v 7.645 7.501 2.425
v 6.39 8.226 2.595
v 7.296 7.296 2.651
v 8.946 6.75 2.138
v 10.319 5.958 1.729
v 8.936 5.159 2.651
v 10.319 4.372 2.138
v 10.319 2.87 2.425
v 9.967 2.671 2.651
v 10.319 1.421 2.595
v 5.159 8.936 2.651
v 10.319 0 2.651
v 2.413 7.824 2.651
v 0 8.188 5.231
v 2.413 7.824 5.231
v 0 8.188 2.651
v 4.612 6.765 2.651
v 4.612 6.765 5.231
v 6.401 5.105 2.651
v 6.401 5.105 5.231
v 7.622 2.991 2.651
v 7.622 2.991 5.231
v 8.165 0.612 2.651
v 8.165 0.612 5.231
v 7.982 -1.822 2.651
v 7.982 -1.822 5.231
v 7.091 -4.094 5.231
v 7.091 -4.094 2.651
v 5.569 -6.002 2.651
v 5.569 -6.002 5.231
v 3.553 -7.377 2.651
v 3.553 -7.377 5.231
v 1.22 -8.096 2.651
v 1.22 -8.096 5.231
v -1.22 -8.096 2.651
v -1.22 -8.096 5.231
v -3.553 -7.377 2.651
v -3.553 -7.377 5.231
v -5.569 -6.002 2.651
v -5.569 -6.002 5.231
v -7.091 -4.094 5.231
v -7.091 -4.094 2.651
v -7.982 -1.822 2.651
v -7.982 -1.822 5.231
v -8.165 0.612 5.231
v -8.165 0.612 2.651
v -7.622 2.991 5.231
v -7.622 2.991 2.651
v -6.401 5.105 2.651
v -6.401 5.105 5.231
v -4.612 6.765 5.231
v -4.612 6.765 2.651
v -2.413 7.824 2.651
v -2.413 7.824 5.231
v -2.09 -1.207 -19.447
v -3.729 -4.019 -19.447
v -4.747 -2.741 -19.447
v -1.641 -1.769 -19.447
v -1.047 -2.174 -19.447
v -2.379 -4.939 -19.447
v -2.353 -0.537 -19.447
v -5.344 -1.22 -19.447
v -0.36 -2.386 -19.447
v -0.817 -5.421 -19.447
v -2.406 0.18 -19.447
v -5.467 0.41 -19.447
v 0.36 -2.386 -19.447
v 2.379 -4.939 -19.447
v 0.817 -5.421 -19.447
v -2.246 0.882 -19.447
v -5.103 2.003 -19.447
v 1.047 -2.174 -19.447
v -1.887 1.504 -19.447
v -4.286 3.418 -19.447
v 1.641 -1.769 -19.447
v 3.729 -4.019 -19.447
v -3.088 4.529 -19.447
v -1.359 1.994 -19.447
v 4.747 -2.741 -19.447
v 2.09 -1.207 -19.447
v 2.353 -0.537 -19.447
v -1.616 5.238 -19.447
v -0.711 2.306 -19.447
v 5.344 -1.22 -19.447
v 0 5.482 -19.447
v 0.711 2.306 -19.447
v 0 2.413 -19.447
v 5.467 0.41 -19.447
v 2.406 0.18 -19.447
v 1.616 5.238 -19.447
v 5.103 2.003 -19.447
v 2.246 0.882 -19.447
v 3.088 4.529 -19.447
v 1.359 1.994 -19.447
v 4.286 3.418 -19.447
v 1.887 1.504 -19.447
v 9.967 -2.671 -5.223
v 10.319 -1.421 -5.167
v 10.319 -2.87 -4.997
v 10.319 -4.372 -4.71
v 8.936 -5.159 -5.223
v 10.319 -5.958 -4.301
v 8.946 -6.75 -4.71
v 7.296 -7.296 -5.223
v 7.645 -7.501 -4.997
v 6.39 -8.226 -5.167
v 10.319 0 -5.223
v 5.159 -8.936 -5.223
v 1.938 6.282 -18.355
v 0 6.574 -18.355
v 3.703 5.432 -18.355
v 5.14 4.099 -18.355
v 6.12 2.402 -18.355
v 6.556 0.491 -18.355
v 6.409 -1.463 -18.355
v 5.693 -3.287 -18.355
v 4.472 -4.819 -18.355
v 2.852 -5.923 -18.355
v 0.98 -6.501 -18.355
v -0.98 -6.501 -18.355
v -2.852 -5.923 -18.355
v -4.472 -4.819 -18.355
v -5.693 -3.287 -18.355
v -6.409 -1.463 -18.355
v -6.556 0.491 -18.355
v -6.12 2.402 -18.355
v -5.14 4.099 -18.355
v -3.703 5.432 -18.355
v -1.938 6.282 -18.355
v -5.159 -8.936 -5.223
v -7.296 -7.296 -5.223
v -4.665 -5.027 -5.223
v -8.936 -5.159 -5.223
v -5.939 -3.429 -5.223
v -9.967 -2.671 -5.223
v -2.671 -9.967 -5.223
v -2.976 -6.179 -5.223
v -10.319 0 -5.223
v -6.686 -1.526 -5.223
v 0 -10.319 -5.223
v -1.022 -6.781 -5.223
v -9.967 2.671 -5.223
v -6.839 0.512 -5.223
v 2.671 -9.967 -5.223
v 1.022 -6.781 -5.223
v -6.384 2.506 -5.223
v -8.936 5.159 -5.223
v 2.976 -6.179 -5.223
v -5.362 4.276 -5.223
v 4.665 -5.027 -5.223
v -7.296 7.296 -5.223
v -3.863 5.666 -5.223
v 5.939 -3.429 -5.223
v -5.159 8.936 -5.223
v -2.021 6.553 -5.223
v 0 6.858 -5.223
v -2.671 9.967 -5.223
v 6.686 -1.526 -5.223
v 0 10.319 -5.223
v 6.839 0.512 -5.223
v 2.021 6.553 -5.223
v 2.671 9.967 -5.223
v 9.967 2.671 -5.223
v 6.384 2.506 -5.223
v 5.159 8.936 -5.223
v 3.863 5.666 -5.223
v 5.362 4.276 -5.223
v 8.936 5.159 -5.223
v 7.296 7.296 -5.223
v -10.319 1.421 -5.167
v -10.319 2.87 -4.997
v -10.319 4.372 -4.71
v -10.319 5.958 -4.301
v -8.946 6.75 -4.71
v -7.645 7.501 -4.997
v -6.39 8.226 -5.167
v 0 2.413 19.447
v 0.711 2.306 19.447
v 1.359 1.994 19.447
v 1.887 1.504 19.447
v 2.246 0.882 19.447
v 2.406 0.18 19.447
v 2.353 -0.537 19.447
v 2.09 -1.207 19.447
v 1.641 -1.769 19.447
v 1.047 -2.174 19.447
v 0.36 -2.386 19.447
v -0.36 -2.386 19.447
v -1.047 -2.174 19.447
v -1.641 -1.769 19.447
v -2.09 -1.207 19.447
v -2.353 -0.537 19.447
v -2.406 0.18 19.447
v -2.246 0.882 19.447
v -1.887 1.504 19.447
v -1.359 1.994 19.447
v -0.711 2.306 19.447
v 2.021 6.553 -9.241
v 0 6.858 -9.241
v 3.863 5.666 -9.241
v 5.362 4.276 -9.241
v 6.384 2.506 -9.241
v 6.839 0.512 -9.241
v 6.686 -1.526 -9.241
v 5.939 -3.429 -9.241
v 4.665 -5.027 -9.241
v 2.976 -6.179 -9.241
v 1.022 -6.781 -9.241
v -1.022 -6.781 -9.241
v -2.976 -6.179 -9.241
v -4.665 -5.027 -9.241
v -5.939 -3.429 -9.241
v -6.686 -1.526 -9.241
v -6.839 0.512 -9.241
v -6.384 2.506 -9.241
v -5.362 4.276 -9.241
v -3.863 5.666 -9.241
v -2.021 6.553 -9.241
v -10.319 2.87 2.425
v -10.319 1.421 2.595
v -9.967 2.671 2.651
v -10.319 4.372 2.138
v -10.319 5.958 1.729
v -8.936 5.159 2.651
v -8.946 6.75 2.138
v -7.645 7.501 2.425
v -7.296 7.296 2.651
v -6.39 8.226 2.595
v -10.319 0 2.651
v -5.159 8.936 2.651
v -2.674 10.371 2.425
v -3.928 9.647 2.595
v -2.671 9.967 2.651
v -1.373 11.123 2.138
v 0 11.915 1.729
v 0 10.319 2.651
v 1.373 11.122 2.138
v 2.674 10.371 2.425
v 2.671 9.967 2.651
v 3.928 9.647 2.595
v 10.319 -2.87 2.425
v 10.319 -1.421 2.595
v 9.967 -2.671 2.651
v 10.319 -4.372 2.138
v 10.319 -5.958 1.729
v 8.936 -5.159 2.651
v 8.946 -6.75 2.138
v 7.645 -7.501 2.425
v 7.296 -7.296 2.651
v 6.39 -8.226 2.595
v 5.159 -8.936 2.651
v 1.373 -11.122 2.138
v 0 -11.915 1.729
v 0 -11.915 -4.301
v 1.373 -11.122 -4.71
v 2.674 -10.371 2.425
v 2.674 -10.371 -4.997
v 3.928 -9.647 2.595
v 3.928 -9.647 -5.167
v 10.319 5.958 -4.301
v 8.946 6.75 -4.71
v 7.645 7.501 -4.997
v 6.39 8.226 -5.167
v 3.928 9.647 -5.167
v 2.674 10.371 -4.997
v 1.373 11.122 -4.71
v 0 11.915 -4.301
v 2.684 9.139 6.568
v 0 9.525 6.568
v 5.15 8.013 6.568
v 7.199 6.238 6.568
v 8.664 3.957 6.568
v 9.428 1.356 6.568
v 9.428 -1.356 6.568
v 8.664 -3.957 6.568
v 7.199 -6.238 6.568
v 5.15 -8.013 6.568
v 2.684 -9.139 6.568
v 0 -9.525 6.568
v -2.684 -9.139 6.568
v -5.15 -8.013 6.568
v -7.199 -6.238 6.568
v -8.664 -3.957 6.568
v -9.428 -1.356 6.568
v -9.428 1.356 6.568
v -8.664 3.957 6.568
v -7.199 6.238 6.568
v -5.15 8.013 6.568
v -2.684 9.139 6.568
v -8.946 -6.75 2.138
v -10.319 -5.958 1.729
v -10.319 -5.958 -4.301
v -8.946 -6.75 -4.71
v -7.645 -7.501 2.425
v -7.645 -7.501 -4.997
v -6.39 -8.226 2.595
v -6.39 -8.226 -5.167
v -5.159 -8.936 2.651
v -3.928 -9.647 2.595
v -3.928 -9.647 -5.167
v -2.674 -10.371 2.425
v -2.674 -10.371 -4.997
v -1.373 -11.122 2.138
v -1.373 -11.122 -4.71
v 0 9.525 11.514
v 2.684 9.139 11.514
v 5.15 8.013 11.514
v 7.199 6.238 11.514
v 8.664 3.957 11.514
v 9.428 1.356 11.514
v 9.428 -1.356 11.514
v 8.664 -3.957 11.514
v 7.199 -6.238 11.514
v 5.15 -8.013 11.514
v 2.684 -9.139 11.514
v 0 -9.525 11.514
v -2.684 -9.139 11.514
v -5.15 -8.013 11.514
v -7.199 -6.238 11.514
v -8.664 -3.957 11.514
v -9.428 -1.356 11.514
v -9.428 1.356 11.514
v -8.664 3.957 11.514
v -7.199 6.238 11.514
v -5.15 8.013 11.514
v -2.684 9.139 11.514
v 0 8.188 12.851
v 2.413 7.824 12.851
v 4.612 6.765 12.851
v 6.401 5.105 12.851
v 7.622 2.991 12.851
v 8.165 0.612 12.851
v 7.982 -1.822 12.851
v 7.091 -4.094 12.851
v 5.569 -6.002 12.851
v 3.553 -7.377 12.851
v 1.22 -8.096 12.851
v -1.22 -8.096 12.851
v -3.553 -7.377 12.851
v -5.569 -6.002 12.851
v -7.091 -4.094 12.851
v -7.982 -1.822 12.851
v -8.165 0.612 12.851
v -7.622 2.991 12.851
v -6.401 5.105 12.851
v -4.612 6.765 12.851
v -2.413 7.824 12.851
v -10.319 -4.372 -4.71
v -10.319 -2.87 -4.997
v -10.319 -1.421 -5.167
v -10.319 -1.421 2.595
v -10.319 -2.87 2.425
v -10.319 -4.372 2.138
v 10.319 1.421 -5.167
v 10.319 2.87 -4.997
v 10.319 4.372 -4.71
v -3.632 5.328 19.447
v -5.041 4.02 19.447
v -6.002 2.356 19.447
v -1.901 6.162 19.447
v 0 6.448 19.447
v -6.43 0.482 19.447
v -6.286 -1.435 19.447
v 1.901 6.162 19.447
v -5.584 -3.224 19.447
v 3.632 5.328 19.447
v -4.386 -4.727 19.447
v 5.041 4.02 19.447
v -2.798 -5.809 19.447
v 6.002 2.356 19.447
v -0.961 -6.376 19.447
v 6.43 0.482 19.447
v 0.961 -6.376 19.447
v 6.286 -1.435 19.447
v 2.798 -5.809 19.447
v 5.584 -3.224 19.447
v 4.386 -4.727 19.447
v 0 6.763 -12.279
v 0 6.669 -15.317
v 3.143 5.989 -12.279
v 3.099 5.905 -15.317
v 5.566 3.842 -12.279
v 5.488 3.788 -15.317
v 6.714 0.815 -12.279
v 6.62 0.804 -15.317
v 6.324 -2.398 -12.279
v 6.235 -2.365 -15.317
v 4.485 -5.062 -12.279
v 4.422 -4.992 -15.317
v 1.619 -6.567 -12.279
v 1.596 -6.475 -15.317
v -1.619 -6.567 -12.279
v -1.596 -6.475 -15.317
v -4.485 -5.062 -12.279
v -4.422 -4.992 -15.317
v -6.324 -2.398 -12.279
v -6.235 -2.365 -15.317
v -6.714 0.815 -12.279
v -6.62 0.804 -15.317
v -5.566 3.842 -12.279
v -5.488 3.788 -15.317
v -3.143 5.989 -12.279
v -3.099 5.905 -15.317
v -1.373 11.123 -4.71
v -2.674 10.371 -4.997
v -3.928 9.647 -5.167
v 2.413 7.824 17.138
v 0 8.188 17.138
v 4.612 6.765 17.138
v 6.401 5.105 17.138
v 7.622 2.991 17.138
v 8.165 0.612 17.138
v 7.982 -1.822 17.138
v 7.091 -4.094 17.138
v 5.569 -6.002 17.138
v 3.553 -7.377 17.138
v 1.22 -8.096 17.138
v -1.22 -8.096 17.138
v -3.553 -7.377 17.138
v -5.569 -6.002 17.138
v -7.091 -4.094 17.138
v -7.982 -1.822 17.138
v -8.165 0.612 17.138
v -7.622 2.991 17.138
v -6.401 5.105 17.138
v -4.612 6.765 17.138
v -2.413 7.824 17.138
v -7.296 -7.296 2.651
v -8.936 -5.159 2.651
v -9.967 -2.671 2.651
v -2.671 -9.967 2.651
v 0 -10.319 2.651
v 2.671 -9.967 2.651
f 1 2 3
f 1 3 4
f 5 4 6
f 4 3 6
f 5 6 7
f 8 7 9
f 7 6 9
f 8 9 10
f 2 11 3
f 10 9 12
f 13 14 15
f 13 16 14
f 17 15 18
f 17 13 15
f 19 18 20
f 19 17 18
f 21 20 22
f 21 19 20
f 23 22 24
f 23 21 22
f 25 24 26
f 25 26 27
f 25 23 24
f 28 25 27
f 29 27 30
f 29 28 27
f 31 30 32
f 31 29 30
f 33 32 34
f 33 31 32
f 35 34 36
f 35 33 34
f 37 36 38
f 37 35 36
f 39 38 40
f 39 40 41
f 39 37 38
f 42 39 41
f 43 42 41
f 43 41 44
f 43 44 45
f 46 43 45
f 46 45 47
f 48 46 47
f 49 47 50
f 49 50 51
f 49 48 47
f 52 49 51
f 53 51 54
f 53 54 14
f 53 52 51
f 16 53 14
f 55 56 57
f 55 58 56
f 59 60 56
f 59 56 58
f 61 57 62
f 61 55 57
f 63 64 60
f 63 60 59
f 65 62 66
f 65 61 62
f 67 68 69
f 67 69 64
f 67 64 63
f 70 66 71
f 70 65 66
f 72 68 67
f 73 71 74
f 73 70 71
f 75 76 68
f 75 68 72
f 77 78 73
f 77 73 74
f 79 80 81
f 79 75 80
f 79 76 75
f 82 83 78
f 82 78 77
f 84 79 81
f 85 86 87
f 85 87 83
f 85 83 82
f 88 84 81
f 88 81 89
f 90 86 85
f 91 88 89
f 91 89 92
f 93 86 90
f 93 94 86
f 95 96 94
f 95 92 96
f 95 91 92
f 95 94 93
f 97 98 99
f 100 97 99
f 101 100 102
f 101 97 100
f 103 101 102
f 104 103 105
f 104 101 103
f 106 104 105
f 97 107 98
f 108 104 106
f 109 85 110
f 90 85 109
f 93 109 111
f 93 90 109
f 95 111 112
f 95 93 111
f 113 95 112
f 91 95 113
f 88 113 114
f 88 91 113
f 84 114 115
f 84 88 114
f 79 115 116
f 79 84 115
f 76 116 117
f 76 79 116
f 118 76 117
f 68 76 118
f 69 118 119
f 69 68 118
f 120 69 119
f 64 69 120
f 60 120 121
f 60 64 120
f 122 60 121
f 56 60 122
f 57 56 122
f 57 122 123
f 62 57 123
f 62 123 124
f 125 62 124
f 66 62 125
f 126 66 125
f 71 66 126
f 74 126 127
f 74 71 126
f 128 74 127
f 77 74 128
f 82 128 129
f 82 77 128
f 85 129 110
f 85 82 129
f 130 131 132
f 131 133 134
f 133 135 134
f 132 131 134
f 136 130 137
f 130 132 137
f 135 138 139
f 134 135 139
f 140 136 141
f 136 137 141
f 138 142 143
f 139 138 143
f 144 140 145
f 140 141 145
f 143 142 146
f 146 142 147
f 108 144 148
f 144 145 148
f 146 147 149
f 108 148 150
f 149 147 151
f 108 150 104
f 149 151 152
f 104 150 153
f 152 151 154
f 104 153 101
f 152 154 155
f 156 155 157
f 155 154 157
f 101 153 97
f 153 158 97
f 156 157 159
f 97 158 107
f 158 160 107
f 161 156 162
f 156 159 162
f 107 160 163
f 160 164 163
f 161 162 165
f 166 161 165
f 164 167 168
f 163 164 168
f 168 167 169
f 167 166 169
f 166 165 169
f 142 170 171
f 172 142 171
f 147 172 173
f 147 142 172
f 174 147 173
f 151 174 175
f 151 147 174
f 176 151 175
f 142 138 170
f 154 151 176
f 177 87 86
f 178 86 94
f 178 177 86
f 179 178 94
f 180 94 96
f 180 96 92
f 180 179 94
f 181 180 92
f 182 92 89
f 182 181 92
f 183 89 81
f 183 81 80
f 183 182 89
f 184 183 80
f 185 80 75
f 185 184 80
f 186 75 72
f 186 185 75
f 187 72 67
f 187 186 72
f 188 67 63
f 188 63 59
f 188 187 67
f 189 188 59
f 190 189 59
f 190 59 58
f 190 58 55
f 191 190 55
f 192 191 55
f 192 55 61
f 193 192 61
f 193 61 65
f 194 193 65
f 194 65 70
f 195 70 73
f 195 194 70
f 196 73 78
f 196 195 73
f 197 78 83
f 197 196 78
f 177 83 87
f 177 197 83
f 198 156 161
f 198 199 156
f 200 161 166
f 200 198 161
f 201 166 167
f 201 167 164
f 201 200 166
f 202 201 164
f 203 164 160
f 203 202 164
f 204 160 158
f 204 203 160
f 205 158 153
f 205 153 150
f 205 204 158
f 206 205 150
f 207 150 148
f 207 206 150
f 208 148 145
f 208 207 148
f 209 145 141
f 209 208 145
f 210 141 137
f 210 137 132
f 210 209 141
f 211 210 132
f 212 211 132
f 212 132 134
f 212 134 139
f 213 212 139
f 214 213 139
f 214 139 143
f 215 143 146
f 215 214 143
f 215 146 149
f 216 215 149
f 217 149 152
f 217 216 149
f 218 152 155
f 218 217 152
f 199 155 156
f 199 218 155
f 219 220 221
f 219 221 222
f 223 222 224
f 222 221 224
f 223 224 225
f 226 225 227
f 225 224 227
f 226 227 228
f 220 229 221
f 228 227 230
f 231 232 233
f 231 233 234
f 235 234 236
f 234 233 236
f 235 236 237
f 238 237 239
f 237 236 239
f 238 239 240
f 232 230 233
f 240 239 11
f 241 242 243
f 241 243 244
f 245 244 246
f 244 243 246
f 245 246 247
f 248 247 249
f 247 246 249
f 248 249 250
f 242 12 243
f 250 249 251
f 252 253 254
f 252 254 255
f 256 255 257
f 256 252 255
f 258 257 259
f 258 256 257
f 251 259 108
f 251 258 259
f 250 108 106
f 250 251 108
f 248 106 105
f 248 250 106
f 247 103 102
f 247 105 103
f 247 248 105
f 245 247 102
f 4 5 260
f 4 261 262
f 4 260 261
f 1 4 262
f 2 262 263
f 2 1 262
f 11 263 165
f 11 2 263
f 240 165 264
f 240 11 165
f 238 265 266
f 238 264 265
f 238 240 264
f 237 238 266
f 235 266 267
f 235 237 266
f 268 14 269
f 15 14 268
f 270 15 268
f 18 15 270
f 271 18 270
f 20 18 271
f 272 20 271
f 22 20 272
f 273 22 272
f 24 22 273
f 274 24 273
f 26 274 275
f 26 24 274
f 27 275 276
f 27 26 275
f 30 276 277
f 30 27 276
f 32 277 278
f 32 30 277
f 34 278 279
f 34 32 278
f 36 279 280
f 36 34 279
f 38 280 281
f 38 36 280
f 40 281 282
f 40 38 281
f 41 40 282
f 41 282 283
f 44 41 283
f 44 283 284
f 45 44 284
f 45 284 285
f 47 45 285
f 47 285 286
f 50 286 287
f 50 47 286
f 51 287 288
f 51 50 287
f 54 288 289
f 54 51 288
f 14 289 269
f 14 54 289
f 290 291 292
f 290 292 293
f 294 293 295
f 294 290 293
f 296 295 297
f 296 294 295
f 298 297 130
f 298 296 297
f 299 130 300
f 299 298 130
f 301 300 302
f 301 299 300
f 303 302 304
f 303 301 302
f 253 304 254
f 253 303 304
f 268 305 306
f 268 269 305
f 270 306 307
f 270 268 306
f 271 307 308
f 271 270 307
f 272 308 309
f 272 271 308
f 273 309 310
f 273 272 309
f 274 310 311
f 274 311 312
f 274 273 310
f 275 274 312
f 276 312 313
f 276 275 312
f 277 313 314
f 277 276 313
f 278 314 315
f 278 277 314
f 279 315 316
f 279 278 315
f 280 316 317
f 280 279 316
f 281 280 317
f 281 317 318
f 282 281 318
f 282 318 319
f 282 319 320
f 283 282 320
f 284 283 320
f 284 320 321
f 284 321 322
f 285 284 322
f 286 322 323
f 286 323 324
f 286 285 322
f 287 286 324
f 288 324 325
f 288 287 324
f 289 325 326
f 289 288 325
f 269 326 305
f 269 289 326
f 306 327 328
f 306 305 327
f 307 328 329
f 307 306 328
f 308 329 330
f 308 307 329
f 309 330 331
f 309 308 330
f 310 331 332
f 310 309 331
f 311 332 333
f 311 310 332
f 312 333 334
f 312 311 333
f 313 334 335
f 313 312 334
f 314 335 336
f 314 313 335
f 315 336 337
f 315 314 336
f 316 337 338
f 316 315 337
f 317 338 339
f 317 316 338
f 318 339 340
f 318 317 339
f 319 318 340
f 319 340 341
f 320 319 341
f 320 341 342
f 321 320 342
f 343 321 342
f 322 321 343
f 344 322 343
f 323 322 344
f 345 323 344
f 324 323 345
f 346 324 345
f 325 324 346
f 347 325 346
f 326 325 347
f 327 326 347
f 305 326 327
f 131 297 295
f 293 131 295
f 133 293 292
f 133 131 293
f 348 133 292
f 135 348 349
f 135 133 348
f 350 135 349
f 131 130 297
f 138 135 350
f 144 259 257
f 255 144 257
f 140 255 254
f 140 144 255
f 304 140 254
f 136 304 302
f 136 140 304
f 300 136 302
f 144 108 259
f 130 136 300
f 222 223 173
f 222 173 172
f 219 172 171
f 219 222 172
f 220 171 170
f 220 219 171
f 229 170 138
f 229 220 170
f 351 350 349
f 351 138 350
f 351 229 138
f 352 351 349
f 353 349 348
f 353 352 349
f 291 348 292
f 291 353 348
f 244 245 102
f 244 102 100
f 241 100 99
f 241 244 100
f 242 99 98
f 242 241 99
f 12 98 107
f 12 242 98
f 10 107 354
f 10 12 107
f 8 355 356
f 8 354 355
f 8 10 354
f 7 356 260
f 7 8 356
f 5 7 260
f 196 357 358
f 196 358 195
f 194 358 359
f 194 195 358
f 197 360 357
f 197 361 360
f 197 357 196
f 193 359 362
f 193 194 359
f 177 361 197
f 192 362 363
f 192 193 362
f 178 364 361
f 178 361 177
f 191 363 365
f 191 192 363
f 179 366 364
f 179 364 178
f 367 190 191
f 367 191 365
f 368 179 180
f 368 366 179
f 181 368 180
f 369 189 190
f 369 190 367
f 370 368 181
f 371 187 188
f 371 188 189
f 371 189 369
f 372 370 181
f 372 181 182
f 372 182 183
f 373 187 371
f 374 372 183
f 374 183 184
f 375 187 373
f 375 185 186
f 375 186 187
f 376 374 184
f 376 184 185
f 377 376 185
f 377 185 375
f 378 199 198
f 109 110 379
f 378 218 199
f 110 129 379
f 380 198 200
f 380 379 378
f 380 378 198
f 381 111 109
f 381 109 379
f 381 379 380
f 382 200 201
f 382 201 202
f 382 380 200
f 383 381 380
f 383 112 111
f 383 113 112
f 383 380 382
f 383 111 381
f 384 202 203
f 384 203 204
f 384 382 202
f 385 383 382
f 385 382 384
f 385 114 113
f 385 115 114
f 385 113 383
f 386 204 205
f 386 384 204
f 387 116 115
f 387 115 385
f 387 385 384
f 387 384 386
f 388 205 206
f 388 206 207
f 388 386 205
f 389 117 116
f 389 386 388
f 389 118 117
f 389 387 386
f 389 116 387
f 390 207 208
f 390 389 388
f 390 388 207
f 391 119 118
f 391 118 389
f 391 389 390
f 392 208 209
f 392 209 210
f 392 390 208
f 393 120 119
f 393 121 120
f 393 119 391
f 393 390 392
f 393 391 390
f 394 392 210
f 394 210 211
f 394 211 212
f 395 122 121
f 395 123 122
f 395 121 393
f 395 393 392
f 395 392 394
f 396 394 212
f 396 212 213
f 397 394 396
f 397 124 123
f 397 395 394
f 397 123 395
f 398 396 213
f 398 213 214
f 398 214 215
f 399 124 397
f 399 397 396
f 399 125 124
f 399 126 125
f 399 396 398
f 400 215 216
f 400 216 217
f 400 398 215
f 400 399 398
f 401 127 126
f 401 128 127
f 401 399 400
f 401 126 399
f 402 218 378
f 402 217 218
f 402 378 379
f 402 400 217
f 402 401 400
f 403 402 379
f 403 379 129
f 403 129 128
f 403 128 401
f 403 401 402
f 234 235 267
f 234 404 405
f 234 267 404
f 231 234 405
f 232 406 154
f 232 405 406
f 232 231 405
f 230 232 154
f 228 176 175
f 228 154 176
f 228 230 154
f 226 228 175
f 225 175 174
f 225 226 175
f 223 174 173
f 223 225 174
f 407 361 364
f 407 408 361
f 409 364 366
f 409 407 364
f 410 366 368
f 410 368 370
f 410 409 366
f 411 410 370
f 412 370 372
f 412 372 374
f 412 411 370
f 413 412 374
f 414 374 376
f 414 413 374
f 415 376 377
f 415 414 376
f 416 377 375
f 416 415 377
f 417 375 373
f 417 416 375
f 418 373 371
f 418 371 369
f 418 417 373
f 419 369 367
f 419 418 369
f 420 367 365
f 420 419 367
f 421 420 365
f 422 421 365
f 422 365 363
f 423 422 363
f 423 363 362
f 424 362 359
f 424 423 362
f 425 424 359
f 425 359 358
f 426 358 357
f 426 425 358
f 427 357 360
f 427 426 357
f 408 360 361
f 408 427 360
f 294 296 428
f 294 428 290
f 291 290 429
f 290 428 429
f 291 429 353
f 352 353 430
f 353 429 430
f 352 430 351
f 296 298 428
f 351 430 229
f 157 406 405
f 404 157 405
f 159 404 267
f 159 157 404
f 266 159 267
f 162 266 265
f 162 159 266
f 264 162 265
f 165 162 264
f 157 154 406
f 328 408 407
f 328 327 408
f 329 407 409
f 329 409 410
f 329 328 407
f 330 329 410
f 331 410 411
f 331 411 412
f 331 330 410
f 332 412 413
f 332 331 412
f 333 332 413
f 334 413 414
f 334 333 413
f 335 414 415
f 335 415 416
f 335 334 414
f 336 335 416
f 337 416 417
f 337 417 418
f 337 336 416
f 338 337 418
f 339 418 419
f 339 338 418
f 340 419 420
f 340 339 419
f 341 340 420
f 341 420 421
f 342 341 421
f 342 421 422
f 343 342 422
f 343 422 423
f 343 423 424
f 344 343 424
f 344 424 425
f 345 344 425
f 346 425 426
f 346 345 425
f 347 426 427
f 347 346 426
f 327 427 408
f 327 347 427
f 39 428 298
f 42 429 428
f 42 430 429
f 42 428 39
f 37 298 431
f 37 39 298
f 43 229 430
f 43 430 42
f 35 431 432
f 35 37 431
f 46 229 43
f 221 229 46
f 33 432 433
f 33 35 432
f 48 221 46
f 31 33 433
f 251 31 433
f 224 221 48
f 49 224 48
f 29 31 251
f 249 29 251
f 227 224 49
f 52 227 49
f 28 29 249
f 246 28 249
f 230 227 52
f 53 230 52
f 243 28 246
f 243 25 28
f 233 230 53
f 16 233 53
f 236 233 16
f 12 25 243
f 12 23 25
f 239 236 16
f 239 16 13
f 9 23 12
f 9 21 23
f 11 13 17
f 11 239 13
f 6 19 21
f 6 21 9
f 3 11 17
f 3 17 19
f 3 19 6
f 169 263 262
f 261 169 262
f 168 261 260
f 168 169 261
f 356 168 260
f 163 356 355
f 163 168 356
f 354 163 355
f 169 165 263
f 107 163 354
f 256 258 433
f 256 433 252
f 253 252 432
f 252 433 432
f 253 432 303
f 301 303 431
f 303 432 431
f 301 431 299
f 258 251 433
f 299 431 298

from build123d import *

# Parameters (mm, degrees)
SKETCH2_R           = 10.19175
BOSS_EXTRUDE1_DEPTH = 7.874


with BuildPart() as part:
    # Sketch1 → Revolve1 (revolve)
    with BuildSketch(Plane(origin=(0, 0, 0), x_dir=(0, 0, -1), z_dir=(1, 0, 0))):
        Polygon((-19.446875, 2.413), (-19.446875, 6.448056668), (-17.138253125, 8.187728032), (-12.8508125, 8.187728032), (-11.513540532, 9.525), (-6.568084468, 9.525), (-5.2308125, 8.187728032), (-2.651125, 8.187728032), (-2.651125, 10.31875), (5.222875, 10.31875), (5.222875, 6.858), (9.241155, 6.858), (18.354531448, 6.574254175), (19.446875, 5.481910623), (19.446875, 2.413), align=None)
    revolve(axis=Axis((0, 0, 19.446875), (0, 0, -1)))

    # Sketch2 → Boss-Extrude1 (add)
    with BuildSketch(Plane.XY.offset(2.651125)):
        Polygon((0, 11.91506618), (-10.31875, 5.95753309), (-10.31875, -5.95753309), (0, -11.91506618), (10.31875, -5.95753309), (10.31875, 5.95753309), align=None)
        Circle(SKETCH2_R, mode=Mode.SUBTRACT)
    extrude(amount=-BOSS_EXTRUDE1_DEPTH)

    # Sketch3 → Cut-Revolve1 (revolve, cut)
    with BuildSketch(Plane(origin=(0, 0, 0), x_dir=(0, 0, -1), z_dir=(1, 0, 0))):
        Polygon((-2.651125, 10.31875), (-2.651125, 11.91506618), (-1.729491424, 11.91506618), align=None)
        Polygon((4.301241424, 11.91506618), (5.222875, 10.31875), (5.222875, 11.91506618), align=None)
    revolve(axis=Axis((0, 0, 19.446875), (0, 0, -1)), mode=Mode.SUBTRACT)


solid = part.part
